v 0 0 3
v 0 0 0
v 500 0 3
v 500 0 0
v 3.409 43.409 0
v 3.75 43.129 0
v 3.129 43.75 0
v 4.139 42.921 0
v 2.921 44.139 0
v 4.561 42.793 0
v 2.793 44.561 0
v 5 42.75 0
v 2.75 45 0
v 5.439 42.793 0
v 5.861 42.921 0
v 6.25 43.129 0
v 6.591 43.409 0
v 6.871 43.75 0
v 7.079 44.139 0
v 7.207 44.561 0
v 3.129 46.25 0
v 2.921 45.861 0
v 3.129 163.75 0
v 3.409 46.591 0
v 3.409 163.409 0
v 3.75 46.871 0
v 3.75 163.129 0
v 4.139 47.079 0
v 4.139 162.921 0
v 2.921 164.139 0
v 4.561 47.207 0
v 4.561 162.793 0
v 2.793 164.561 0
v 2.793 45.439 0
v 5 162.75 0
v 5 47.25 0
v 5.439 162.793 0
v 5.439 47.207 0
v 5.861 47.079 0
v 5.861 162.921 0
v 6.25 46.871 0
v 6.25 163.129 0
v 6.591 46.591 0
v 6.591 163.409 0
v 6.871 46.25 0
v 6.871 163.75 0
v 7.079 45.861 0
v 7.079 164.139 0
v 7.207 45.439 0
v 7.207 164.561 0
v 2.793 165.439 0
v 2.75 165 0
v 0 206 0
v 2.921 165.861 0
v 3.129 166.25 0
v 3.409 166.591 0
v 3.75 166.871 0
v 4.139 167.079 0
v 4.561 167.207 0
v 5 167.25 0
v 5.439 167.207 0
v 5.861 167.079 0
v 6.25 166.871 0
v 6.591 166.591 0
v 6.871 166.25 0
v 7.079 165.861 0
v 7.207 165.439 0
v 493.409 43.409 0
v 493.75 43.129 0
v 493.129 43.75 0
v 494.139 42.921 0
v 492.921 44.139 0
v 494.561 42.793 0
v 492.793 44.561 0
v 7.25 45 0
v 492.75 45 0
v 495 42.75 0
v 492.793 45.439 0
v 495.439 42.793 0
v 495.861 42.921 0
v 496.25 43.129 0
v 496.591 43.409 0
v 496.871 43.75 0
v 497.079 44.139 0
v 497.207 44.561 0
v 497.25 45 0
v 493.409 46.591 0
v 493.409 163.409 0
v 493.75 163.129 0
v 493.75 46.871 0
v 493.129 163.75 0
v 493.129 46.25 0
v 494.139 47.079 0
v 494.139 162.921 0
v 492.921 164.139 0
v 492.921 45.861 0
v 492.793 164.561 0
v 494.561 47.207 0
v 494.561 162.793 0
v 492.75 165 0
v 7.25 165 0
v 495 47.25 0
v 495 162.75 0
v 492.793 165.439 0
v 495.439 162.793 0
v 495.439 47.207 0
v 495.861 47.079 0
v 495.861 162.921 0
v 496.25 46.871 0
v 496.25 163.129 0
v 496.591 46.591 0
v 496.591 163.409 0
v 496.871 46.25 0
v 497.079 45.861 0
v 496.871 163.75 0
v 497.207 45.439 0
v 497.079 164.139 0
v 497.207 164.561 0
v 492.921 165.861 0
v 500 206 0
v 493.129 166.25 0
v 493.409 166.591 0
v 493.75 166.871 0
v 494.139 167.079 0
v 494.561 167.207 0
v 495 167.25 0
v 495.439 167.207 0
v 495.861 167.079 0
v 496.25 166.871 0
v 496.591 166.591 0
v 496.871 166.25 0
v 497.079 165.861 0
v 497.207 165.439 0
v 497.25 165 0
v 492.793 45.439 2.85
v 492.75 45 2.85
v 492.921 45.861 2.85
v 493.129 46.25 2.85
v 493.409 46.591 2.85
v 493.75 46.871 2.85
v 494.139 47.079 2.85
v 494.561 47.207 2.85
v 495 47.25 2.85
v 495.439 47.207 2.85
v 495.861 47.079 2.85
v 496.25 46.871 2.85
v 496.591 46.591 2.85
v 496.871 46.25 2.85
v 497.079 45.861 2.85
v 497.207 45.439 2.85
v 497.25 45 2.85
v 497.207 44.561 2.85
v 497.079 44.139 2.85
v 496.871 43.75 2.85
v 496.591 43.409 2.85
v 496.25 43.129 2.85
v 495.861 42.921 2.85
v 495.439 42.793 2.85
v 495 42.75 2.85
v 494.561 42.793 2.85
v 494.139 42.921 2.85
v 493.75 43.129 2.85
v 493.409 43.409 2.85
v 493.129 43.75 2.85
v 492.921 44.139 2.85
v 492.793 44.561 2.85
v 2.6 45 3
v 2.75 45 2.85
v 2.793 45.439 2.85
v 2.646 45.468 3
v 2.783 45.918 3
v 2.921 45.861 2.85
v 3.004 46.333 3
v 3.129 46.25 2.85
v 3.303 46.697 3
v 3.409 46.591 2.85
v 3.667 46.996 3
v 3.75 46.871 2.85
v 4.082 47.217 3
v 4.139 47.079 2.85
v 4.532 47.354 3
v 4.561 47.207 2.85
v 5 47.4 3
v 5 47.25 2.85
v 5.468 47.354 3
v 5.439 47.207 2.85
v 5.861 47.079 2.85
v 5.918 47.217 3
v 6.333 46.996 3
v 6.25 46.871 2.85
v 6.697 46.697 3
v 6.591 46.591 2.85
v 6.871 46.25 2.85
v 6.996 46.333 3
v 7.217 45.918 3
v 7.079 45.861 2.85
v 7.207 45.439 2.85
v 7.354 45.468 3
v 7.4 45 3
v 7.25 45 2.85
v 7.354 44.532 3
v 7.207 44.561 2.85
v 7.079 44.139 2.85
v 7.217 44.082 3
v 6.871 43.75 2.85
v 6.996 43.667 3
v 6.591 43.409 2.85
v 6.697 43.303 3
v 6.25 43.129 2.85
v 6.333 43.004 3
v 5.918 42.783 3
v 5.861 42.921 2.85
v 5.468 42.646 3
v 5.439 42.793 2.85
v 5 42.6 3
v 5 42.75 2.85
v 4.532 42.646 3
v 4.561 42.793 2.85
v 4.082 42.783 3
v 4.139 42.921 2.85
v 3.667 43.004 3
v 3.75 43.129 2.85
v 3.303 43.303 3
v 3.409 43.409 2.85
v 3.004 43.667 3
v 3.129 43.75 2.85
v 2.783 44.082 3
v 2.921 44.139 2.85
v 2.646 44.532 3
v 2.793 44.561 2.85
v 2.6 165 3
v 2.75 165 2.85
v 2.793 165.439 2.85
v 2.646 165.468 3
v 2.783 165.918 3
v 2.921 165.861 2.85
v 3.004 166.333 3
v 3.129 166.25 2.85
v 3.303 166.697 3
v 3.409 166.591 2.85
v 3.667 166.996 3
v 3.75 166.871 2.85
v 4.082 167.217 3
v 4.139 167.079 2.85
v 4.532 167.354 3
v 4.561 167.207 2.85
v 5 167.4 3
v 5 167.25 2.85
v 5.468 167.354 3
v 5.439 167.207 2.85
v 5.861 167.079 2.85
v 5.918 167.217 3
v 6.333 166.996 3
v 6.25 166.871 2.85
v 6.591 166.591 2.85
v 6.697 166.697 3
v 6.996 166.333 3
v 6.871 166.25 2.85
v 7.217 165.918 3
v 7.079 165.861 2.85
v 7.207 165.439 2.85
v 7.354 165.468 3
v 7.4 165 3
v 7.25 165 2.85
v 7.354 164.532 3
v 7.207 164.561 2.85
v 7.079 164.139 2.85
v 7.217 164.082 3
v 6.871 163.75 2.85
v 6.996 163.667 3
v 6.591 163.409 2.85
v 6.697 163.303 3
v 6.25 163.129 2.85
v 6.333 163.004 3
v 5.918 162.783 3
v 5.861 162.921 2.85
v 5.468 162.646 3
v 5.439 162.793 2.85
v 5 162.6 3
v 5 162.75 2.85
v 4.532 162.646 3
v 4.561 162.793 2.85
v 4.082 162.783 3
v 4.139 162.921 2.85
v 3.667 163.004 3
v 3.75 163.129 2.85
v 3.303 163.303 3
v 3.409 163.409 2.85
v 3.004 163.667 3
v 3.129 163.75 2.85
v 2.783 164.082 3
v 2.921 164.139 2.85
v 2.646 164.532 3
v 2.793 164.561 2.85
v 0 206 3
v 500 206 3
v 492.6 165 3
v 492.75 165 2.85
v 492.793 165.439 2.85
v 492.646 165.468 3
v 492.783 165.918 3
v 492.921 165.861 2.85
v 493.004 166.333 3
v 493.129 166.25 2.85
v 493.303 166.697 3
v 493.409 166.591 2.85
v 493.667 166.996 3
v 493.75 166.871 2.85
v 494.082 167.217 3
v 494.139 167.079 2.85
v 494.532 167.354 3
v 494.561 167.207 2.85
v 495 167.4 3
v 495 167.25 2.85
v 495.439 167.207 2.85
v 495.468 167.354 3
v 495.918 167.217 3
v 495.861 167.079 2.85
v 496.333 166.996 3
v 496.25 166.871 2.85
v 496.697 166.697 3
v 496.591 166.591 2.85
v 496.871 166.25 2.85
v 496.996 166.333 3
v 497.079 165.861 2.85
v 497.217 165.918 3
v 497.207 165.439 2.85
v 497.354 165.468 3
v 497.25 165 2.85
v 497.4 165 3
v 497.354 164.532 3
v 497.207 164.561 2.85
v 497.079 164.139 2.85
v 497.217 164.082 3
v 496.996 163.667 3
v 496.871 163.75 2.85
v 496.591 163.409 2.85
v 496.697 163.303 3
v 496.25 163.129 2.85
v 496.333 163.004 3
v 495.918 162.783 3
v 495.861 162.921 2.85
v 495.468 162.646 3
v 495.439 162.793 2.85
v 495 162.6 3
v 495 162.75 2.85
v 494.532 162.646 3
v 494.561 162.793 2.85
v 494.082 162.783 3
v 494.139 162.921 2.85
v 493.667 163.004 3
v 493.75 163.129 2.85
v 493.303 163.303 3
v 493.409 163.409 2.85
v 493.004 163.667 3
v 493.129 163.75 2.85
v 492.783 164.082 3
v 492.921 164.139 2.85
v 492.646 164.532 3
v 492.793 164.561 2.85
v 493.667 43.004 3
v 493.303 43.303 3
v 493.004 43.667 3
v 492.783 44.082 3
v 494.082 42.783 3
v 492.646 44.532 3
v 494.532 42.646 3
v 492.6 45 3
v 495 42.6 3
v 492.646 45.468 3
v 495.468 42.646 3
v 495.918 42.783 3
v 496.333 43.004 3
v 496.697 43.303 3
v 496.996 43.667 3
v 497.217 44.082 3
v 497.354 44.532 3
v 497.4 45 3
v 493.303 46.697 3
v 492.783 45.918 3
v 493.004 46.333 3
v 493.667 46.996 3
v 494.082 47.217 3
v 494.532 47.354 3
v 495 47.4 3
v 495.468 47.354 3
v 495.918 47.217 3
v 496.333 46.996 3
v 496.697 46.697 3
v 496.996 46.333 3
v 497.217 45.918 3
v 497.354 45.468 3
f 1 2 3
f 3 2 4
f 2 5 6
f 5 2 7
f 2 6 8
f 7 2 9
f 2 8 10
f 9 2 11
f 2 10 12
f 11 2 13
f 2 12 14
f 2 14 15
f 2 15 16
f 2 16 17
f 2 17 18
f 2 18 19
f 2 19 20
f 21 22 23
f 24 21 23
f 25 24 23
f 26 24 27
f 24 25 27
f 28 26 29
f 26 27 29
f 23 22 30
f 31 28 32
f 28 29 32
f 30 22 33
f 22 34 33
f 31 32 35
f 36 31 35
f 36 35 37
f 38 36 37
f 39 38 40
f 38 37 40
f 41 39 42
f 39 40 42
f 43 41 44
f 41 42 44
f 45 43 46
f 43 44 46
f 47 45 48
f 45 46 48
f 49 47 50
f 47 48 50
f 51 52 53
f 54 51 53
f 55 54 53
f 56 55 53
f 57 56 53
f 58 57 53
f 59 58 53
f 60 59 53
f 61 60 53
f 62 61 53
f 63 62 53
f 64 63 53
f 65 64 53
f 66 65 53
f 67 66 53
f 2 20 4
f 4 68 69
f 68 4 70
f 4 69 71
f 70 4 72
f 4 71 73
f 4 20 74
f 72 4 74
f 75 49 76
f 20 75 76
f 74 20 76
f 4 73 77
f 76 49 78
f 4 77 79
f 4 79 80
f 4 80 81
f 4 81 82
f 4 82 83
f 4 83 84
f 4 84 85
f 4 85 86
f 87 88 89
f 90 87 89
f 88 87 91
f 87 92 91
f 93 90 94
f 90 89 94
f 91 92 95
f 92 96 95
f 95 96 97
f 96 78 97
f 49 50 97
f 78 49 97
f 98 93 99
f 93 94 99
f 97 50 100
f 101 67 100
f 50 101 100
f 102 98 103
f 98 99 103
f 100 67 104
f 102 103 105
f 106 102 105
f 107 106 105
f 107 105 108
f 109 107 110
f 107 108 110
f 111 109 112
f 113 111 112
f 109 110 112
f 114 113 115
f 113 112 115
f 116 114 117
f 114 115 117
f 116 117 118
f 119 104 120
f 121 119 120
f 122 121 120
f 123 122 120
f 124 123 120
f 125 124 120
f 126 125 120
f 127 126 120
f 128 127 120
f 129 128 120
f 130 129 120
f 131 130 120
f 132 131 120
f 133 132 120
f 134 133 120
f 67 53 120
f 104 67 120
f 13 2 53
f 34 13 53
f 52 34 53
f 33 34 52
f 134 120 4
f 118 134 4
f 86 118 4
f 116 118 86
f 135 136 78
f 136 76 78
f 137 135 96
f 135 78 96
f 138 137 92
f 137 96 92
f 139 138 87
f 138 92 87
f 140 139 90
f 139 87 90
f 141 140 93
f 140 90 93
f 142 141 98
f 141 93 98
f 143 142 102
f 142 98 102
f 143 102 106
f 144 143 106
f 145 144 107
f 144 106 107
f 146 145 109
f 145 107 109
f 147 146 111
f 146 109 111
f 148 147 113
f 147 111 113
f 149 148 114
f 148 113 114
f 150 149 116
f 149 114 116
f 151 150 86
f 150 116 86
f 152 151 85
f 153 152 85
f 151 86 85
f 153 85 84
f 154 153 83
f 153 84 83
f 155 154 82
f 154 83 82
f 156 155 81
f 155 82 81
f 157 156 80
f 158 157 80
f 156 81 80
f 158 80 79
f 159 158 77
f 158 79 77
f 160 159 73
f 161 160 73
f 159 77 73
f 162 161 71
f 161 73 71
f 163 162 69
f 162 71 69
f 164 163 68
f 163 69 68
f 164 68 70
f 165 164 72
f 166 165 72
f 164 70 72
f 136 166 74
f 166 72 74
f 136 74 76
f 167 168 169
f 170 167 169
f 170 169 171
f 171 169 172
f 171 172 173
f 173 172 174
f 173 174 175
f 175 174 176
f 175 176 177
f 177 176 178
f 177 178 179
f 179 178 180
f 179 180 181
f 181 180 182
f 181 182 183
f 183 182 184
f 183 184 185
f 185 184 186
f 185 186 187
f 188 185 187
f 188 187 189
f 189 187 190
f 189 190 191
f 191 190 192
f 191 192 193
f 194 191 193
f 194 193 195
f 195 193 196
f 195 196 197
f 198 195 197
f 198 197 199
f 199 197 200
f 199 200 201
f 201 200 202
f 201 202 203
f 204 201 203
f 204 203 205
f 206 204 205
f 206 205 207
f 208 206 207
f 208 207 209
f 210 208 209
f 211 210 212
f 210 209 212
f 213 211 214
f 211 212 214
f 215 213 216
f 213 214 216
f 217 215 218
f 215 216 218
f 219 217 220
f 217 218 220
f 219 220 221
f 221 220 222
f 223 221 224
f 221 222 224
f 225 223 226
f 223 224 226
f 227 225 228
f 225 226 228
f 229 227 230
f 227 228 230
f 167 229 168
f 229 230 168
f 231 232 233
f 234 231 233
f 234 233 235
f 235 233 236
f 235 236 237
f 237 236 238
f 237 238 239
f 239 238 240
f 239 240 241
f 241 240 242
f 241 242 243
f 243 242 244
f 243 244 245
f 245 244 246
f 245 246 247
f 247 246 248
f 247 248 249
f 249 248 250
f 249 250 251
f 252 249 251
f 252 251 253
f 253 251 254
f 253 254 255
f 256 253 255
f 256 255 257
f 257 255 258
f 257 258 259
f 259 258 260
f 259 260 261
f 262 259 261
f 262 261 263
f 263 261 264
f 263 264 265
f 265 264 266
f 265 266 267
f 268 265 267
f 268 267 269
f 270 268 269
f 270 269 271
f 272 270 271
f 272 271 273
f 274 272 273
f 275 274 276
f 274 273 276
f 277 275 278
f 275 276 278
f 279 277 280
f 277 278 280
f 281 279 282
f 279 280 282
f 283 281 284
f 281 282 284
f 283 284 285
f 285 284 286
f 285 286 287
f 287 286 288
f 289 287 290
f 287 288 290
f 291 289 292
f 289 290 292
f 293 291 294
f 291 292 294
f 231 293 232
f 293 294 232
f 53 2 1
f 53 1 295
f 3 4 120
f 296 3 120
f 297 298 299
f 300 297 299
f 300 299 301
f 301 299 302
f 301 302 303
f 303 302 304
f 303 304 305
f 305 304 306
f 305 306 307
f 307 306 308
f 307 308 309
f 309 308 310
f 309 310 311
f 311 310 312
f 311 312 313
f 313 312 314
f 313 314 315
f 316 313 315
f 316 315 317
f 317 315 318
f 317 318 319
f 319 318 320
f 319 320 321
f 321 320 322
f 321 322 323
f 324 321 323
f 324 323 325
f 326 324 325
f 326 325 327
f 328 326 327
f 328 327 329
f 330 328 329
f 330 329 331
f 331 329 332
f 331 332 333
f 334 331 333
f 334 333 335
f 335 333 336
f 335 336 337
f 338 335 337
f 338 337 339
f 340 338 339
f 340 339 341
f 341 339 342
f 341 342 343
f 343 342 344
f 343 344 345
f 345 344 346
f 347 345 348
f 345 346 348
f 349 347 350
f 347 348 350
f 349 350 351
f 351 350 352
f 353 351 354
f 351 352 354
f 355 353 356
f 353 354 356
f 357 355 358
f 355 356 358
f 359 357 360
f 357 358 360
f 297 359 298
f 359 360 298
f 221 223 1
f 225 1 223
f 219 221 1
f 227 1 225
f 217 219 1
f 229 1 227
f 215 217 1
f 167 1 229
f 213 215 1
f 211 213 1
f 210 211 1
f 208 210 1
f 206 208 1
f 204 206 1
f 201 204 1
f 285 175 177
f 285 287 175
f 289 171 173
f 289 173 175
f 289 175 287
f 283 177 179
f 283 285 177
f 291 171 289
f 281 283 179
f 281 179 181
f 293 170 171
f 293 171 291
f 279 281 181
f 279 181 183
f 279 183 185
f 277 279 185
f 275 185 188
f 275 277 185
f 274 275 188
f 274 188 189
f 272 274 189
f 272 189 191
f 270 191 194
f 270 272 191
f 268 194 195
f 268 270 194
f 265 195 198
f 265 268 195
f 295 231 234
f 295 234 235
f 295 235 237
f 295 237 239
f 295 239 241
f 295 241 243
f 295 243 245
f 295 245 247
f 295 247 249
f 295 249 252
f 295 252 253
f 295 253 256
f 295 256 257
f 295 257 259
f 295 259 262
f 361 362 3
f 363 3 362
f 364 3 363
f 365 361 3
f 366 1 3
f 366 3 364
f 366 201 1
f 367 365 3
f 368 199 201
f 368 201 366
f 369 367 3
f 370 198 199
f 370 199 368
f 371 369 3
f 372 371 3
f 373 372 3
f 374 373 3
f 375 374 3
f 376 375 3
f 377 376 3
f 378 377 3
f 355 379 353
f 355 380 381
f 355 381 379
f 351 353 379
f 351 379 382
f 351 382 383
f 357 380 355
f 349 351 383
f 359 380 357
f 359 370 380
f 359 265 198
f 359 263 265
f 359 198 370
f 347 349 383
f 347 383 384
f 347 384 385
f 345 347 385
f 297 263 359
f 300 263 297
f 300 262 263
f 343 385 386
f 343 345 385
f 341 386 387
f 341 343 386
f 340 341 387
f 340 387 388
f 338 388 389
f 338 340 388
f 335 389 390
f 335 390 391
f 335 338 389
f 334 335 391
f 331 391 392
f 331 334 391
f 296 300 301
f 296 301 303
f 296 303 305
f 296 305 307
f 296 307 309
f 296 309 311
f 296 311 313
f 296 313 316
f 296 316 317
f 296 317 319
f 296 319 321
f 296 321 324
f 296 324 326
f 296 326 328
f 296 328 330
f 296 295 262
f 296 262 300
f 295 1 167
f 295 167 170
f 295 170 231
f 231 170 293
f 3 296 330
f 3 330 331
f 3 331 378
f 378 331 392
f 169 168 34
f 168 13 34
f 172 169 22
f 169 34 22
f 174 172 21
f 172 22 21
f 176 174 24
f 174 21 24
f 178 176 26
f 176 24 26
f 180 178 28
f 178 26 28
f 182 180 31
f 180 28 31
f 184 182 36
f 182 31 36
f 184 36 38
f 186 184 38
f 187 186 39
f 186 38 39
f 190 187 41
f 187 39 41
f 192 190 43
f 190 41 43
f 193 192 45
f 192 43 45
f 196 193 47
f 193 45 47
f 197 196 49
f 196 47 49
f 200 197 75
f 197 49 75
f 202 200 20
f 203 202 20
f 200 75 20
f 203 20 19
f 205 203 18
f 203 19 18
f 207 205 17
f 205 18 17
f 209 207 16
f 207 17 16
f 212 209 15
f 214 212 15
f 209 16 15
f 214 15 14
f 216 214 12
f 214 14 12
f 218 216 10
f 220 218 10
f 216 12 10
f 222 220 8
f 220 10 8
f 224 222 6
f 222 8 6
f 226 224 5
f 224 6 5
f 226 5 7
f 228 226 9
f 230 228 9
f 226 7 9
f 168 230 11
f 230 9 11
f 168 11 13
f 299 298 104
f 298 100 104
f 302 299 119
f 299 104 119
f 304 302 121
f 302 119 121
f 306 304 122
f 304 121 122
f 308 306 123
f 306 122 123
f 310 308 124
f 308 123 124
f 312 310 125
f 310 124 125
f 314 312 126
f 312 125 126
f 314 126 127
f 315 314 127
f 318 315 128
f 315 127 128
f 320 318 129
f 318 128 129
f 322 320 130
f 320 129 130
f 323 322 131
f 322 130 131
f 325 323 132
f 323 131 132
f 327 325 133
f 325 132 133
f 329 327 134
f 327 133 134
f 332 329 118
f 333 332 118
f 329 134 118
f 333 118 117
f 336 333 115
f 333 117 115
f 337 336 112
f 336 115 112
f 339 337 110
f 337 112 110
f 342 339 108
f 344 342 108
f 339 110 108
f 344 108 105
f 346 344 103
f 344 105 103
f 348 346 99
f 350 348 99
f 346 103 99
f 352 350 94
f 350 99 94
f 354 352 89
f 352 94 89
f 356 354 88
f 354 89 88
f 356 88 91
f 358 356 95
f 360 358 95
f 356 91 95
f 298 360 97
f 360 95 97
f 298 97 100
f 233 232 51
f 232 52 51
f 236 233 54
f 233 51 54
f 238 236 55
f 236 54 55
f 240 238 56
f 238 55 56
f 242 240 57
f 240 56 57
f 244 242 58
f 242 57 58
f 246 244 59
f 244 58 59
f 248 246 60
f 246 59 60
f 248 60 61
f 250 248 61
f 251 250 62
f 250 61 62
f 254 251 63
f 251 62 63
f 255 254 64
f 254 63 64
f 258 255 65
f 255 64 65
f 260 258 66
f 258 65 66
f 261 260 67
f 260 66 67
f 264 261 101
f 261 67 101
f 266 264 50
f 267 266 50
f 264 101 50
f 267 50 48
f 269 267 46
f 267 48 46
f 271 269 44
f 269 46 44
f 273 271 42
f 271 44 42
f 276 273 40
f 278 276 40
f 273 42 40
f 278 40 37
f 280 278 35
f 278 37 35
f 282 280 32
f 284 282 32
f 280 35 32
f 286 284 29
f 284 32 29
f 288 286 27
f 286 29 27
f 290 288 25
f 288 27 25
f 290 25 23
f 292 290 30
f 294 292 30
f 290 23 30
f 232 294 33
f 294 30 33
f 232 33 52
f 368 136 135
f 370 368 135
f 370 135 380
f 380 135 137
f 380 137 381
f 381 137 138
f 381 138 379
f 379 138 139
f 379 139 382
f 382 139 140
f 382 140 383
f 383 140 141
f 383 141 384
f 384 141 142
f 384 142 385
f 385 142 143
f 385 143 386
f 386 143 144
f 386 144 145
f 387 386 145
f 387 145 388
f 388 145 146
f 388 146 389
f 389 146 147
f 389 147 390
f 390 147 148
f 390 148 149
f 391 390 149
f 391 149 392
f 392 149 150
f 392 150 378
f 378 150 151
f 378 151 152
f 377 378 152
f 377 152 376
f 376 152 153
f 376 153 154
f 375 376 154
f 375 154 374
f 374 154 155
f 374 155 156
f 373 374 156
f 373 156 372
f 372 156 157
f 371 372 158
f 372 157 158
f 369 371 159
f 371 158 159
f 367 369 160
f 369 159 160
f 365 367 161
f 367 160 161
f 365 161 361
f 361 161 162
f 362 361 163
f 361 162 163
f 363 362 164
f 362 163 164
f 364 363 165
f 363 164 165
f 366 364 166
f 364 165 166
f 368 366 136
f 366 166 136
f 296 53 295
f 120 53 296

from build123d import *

# Parameters (mm, degrees)
SKETCH_1_W                  = 500
SKETCH_1_H                  = 206
EXTRUDE_1_DEPTH             = 3
HOLE_WIZARD_M41_D           = 4.5
HOLE_WIZARD_M41_DEPTH       = 10
HOLE_WIZARD_M41_CSINK_D     = 4.8
HOLE_WIZARD_M41_CSINK_ANGLE = 90
HOLE_WIZARD_M41_TIP         = 1.351936393


with BuildPart() as part:
    # Эскиз1 → Бобышка-Вытянуть1 (new body)
    with BuildSketch(Plane.XY):
        with Locations((250, 103)):
            Rectangle(SKETCH_1_W, SKETCH_1_H)
    extrude(amount=EXTRUDE_1_DEPTH)

    # Отверстие с зазором M41
    with Locations(Plane.XY.offset(3)):
        with Locations((5, 165), (5, 45), (495, 45), (495, 165)):
            CounterSinkHole(HOLE_WIZARD_M41_D / 2, HOLE_WIZARD_M41_CSINK_D / 2, depth=HOLE_WIZARD_M41_DEPTH, counter_sink_angle=HOLE_WIZARD_M41_CSINK_ANGLE)
            with Locations((0, 0, -(HOLE_WIZARD_M41_DEPTH + HOLE_WIZARD_M41_TIP / 2))):  # 118° drill point
                Cone(0, HOLE_WIZARD_M41_D / 2, HOLE_WIZARD_M41_TIP, mode=Mode.SUBTRACT)


solid = part.part
